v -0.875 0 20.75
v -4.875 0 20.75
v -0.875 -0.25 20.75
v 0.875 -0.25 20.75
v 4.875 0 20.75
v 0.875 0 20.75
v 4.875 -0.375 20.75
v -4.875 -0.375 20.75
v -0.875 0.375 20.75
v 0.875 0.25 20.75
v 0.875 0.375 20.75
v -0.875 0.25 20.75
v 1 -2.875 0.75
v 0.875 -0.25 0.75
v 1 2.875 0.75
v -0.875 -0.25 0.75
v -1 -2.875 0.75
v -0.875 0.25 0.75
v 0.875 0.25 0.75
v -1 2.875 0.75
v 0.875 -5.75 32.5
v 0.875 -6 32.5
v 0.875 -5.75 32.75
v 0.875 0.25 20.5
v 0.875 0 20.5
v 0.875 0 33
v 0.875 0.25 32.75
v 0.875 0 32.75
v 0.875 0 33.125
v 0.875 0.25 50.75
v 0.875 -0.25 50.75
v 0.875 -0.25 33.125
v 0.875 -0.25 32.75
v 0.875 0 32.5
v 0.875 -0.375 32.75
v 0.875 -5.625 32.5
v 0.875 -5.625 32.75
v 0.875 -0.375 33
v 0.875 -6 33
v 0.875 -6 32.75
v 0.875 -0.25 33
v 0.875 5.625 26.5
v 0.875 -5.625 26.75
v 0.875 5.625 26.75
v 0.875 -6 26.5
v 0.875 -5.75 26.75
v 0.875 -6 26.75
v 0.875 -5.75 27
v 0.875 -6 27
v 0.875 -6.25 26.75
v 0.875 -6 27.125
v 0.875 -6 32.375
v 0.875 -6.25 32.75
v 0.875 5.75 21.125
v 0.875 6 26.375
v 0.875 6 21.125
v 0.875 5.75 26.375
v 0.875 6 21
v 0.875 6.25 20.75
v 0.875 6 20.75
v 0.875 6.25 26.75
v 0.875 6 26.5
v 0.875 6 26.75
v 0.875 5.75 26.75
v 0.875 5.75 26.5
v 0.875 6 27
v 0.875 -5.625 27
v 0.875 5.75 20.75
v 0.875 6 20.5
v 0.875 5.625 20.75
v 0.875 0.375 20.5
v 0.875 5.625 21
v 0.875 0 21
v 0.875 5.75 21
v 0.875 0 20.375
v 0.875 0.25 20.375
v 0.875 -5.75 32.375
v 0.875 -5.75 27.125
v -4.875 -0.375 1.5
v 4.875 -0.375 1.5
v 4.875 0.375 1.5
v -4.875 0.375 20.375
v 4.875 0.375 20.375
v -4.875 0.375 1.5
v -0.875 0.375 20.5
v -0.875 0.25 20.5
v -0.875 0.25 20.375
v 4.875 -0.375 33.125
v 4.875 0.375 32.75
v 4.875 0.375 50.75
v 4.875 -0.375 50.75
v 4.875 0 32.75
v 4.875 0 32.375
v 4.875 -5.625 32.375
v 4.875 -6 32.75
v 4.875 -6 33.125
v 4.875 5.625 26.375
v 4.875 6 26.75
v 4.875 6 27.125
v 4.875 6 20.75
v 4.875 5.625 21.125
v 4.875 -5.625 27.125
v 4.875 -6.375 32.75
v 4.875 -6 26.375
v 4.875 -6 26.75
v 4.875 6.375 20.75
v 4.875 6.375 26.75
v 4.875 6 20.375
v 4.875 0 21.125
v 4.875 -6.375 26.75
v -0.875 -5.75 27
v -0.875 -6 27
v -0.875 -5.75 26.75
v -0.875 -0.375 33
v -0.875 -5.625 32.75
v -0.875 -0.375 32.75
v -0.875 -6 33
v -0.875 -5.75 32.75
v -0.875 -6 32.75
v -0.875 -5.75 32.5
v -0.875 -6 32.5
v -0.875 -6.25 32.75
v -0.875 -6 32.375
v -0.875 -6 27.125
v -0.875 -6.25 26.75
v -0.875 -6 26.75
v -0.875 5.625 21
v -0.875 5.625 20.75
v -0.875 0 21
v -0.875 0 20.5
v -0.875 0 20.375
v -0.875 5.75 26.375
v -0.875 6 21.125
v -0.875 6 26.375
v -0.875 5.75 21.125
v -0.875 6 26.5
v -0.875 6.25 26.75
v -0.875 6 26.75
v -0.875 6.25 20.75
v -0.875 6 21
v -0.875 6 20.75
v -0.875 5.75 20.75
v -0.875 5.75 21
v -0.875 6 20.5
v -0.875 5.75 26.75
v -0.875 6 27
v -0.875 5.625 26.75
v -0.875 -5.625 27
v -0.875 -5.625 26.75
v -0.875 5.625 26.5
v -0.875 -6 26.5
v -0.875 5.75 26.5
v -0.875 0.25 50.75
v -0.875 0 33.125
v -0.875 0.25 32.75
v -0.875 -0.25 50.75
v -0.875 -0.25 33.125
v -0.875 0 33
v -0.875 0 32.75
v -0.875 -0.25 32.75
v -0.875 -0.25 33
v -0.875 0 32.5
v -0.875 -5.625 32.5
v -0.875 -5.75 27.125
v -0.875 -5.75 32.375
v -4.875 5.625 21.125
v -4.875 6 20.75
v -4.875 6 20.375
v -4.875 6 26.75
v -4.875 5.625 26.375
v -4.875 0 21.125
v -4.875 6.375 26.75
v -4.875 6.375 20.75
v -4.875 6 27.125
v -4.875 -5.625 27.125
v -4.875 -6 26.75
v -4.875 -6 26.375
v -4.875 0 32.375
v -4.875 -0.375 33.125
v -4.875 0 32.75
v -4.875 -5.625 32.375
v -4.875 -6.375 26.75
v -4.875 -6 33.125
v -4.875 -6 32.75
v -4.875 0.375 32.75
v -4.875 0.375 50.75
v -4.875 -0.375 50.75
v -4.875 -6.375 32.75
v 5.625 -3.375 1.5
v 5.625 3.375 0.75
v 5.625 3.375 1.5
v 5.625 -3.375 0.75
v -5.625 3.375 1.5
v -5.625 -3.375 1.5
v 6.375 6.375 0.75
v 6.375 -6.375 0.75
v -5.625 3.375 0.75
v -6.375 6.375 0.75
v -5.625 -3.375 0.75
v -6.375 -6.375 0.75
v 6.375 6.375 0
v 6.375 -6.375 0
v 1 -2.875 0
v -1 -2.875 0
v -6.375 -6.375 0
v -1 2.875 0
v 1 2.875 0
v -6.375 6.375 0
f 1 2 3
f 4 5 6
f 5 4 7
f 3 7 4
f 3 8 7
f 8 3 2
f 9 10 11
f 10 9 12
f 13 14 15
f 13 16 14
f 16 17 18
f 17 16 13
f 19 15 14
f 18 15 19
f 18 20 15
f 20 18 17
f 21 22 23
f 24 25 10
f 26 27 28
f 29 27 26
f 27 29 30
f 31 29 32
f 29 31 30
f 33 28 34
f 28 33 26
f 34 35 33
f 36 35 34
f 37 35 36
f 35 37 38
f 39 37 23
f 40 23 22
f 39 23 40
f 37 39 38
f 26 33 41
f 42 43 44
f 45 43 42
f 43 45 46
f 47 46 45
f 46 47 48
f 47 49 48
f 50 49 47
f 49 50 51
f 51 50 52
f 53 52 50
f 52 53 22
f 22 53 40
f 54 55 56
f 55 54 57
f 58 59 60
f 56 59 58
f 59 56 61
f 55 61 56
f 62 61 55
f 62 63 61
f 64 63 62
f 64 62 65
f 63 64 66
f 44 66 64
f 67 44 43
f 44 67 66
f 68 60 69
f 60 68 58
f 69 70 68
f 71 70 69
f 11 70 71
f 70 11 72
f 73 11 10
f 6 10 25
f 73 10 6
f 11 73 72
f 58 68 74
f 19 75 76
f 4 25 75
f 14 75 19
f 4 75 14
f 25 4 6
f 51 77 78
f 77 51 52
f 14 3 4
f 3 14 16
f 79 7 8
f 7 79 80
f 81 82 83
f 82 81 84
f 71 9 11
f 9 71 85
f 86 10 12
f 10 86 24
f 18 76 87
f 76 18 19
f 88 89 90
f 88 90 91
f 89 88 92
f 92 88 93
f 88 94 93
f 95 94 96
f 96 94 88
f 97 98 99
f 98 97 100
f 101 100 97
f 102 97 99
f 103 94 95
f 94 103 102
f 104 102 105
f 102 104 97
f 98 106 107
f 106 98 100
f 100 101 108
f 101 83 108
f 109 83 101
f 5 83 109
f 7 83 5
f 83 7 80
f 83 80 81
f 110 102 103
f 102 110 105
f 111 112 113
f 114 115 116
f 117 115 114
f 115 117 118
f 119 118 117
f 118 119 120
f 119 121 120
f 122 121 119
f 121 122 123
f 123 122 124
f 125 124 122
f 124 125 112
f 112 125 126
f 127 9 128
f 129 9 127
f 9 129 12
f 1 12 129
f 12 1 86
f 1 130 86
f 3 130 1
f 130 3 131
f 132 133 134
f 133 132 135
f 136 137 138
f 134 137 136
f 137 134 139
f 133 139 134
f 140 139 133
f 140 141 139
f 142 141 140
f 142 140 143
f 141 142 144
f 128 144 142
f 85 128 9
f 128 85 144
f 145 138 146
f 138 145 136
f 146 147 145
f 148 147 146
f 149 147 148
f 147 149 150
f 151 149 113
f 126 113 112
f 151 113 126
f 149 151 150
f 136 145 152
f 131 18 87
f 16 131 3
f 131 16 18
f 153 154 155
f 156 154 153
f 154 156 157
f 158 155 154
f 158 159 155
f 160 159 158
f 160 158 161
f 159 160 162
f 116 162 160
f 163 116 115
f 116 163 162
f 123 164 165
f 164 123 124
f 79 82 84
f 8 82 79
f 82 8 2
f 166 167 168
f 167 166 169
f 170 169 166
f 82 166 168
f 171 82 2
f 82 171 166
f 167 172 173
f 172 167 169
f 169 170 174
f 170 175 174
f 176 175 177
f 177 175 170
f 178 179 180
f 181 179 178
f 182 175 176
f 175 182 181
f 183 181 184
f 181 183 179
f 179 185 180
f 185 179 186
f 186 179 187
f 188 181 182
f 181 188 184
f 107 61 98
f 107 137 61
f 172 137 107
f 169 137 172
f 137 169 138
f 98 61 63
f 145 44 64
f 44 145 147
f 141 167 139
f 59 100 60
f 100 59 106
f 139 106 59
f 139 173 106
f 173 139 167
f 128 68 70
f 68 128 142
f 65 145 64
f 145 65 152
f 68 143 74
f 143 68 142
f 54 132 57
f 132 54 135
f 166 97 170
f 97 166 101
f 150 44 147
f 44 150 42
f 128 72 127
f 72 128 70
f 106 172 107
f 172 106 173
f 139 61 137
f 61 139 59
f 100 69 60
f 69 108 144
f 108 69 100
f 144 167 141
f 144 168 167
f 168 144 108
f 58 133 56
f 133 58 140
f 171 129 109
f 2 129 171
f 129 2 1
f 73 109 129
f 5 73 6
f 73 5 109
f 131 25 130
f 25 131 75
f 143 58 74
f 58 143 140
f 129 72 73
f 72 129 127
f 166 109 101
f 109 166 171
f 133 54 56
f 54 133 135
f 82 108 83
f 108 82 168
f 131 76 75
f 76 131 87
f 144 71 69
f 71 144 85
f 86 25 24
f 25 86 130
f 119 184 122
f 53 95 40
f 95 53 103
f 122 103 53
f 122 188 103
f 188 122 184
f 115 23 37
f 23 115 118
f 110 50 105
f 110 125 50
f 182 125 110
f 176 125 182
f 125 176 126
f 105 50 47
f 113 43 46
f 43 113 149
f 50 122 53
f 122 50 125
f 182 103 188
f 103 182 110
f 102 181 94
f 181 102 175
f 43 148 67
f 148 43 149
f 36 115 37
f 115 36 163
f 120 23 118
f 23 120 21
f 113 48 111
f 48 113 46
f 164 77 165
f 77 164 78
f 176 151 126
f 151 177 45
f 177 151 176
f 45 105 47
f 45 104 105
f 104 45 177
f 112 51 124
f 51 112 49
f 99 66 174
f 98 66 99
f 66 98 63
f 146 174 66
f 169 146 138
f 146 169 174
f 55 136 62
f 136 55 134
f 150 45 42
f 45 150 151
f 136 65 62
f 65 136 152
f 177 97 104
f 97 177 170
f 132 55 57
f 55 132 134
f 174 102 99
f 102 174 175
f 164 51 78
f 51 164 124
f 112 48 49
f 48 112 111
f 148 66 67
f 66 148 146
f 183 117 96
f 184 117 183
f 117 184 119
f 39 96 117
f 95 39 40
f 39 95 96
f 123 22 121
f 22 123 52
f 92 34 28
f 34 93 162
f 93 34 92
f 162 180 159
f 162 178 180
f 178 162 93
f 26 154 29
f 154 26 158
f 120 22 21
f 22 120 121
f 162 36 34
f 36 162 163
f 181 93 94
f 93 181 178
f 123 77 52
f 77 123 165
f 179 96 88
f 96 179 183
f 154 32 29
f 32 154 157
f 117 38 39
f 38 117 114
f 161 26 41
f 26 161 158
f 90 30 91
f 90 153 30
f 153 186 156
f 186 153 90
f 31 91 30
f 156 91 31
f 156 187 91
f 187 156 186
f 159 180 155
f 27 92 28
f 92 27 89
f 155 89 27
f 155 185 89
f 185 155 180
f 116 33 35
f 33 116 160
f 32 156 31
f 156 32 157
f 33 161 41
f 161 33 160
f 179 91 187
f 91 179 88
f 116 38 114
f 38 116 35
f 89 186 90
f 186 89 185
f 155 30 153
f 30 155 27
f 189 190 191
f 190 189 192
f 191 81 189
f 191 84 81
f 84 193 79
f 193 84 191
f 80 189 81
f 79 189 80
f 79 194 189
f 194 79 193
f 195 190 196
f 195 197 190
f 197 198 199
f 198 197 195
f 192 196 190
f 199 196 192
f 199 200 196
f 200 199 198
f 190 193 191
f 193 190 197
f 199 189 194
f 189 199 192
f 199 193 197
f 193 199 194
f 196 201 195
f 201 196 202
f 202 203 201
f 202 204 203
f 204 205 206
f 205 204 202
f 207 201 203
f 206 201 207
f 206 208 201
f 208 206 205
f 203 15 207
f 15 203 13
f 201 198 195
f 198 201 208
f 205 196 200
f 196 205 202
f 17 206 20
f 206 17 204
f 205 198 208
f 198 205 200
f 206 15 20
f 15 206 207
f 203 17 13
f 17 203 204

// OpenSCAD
wood_width = 4;
wood_thickness = 0.75;
acrylic_width = 2;
acrylic_thickness = 0.125;
acrylic_width = 2;
overlap = 0.125;
wood_offset = acrylic_width / 2 - overlap;
lamp_height = 5 * 12;
lamp_width = wood_width * 2 + acrylic_width - overlap * 2;

module wood(adjust = 0) {
  color([0.41 + adjust, 0.24 + adjust, 0.18 + adjust]) children();
}

module acrylic() color("white", 0.75) children();

module vertical_wood(side, height) {
  difference() {
    wood() cube([wood_width, wood_thickness, height]);
    offset = side ? 0 : wood_width - acrylic_thickness;
    translate([offset, 0, 0]) {
      cube([overlap, acrylic_thickness, height]);
      translate([0, wood_thickness - acrylic_thickness, 0])
        cube([overlap, acrylic_thickness, height]);
    }
  }
}

module strip(height) {
  acrylic() cube([acrylic_width, acrylic_thickness, height]);
}

module section(height) {

  translate([-acrylic_width / 2, -wood_thickness / 2, 0])
    strip(height);

  translate([-acrylic_width / 2, wood_thickness / 2 - acrylic_thickness, 0])
    strip(height);

  translate([wood_offset, -wood_thickness / 2, 0])
    vertical_wood(true, height);

  translate([-wood_offset - wood_width, -wood_thickness / 2, 0])
    vertical_wood(false, height);

}

first_section = 20;
small_section = 6;

translate([0, 0, wood_thickness]) {

section(first_section);
translate([0, small_section, first_section]) section(small_section);
translate([0, 0, first_section]) rotate([-90, 0, 0]) section(small_section);
translate([0, -small_section, first_section + small_section]) section(small_section);
translate([0, 6, first_section + small_section]) rotate([90, 0, 0]) section(12);
translate([0, 0, first_section + 2 * small_section]) rotate([90, 0, 0]) section(small_section);
translate([0, 0, first_section + 12]) section(18);

}

module base(size) {
  wood()
    translate([-size / 2, -size / 2, 0])
      cube([size, size, wood_thickness]);
}

bottom_size = lamp_width + wood_thickness * 4;
bottom_chunk_size = (bottom_size - acrylic_width) / 2;
top_size = (bottom_size - wood_thickness) / 2 + wood_thickness;

module top_strip(offset) {
  wood(0.1)
    translate([offset, -top_size / 2, 0])
      cube([wood_thickness, top_size, wood_thickness]);
}

module top_chunk(offset) {
  wood(-0.1)
    translate([-lamp_width / 2, offset, 0])
      cube([lamp_width, top_size / 2 - wood_thickness / 2, wood_thickness]);
}

module bottom_chunk(offset) {
  wood()
    translate([offset, -bottom_size / 2, -wood_thickness])
      cube([bottom_chunk_size, bottom_size, wood_thickness]);
}

module bottom_strip(offset) {
  size = (bottom_size - wood_thickness) / 2 - 2.5;
  wood(0.1)
    translate([-acrylic_width / 2, offset + wood_thickness / 2, -wood_thickness])
      cube([acrylic_width, size, wood_thickness]);
}

translate([0, 0, wood_thickness]) {
  top_strip(lamp_width / 2);
  top_strip(-lamp_width / 2 - wood_thickness);
  top_chunk(wood_thickness / 2);
  top_chunk(-top_size / 2);
  bottom_chunk(acrylic_width / 2);
  bottom_chunk(-bottom_chunk_size - acrylic_width / 2);
  bottom_strip(2.5);
  bottom_strip(-6.75);
}
